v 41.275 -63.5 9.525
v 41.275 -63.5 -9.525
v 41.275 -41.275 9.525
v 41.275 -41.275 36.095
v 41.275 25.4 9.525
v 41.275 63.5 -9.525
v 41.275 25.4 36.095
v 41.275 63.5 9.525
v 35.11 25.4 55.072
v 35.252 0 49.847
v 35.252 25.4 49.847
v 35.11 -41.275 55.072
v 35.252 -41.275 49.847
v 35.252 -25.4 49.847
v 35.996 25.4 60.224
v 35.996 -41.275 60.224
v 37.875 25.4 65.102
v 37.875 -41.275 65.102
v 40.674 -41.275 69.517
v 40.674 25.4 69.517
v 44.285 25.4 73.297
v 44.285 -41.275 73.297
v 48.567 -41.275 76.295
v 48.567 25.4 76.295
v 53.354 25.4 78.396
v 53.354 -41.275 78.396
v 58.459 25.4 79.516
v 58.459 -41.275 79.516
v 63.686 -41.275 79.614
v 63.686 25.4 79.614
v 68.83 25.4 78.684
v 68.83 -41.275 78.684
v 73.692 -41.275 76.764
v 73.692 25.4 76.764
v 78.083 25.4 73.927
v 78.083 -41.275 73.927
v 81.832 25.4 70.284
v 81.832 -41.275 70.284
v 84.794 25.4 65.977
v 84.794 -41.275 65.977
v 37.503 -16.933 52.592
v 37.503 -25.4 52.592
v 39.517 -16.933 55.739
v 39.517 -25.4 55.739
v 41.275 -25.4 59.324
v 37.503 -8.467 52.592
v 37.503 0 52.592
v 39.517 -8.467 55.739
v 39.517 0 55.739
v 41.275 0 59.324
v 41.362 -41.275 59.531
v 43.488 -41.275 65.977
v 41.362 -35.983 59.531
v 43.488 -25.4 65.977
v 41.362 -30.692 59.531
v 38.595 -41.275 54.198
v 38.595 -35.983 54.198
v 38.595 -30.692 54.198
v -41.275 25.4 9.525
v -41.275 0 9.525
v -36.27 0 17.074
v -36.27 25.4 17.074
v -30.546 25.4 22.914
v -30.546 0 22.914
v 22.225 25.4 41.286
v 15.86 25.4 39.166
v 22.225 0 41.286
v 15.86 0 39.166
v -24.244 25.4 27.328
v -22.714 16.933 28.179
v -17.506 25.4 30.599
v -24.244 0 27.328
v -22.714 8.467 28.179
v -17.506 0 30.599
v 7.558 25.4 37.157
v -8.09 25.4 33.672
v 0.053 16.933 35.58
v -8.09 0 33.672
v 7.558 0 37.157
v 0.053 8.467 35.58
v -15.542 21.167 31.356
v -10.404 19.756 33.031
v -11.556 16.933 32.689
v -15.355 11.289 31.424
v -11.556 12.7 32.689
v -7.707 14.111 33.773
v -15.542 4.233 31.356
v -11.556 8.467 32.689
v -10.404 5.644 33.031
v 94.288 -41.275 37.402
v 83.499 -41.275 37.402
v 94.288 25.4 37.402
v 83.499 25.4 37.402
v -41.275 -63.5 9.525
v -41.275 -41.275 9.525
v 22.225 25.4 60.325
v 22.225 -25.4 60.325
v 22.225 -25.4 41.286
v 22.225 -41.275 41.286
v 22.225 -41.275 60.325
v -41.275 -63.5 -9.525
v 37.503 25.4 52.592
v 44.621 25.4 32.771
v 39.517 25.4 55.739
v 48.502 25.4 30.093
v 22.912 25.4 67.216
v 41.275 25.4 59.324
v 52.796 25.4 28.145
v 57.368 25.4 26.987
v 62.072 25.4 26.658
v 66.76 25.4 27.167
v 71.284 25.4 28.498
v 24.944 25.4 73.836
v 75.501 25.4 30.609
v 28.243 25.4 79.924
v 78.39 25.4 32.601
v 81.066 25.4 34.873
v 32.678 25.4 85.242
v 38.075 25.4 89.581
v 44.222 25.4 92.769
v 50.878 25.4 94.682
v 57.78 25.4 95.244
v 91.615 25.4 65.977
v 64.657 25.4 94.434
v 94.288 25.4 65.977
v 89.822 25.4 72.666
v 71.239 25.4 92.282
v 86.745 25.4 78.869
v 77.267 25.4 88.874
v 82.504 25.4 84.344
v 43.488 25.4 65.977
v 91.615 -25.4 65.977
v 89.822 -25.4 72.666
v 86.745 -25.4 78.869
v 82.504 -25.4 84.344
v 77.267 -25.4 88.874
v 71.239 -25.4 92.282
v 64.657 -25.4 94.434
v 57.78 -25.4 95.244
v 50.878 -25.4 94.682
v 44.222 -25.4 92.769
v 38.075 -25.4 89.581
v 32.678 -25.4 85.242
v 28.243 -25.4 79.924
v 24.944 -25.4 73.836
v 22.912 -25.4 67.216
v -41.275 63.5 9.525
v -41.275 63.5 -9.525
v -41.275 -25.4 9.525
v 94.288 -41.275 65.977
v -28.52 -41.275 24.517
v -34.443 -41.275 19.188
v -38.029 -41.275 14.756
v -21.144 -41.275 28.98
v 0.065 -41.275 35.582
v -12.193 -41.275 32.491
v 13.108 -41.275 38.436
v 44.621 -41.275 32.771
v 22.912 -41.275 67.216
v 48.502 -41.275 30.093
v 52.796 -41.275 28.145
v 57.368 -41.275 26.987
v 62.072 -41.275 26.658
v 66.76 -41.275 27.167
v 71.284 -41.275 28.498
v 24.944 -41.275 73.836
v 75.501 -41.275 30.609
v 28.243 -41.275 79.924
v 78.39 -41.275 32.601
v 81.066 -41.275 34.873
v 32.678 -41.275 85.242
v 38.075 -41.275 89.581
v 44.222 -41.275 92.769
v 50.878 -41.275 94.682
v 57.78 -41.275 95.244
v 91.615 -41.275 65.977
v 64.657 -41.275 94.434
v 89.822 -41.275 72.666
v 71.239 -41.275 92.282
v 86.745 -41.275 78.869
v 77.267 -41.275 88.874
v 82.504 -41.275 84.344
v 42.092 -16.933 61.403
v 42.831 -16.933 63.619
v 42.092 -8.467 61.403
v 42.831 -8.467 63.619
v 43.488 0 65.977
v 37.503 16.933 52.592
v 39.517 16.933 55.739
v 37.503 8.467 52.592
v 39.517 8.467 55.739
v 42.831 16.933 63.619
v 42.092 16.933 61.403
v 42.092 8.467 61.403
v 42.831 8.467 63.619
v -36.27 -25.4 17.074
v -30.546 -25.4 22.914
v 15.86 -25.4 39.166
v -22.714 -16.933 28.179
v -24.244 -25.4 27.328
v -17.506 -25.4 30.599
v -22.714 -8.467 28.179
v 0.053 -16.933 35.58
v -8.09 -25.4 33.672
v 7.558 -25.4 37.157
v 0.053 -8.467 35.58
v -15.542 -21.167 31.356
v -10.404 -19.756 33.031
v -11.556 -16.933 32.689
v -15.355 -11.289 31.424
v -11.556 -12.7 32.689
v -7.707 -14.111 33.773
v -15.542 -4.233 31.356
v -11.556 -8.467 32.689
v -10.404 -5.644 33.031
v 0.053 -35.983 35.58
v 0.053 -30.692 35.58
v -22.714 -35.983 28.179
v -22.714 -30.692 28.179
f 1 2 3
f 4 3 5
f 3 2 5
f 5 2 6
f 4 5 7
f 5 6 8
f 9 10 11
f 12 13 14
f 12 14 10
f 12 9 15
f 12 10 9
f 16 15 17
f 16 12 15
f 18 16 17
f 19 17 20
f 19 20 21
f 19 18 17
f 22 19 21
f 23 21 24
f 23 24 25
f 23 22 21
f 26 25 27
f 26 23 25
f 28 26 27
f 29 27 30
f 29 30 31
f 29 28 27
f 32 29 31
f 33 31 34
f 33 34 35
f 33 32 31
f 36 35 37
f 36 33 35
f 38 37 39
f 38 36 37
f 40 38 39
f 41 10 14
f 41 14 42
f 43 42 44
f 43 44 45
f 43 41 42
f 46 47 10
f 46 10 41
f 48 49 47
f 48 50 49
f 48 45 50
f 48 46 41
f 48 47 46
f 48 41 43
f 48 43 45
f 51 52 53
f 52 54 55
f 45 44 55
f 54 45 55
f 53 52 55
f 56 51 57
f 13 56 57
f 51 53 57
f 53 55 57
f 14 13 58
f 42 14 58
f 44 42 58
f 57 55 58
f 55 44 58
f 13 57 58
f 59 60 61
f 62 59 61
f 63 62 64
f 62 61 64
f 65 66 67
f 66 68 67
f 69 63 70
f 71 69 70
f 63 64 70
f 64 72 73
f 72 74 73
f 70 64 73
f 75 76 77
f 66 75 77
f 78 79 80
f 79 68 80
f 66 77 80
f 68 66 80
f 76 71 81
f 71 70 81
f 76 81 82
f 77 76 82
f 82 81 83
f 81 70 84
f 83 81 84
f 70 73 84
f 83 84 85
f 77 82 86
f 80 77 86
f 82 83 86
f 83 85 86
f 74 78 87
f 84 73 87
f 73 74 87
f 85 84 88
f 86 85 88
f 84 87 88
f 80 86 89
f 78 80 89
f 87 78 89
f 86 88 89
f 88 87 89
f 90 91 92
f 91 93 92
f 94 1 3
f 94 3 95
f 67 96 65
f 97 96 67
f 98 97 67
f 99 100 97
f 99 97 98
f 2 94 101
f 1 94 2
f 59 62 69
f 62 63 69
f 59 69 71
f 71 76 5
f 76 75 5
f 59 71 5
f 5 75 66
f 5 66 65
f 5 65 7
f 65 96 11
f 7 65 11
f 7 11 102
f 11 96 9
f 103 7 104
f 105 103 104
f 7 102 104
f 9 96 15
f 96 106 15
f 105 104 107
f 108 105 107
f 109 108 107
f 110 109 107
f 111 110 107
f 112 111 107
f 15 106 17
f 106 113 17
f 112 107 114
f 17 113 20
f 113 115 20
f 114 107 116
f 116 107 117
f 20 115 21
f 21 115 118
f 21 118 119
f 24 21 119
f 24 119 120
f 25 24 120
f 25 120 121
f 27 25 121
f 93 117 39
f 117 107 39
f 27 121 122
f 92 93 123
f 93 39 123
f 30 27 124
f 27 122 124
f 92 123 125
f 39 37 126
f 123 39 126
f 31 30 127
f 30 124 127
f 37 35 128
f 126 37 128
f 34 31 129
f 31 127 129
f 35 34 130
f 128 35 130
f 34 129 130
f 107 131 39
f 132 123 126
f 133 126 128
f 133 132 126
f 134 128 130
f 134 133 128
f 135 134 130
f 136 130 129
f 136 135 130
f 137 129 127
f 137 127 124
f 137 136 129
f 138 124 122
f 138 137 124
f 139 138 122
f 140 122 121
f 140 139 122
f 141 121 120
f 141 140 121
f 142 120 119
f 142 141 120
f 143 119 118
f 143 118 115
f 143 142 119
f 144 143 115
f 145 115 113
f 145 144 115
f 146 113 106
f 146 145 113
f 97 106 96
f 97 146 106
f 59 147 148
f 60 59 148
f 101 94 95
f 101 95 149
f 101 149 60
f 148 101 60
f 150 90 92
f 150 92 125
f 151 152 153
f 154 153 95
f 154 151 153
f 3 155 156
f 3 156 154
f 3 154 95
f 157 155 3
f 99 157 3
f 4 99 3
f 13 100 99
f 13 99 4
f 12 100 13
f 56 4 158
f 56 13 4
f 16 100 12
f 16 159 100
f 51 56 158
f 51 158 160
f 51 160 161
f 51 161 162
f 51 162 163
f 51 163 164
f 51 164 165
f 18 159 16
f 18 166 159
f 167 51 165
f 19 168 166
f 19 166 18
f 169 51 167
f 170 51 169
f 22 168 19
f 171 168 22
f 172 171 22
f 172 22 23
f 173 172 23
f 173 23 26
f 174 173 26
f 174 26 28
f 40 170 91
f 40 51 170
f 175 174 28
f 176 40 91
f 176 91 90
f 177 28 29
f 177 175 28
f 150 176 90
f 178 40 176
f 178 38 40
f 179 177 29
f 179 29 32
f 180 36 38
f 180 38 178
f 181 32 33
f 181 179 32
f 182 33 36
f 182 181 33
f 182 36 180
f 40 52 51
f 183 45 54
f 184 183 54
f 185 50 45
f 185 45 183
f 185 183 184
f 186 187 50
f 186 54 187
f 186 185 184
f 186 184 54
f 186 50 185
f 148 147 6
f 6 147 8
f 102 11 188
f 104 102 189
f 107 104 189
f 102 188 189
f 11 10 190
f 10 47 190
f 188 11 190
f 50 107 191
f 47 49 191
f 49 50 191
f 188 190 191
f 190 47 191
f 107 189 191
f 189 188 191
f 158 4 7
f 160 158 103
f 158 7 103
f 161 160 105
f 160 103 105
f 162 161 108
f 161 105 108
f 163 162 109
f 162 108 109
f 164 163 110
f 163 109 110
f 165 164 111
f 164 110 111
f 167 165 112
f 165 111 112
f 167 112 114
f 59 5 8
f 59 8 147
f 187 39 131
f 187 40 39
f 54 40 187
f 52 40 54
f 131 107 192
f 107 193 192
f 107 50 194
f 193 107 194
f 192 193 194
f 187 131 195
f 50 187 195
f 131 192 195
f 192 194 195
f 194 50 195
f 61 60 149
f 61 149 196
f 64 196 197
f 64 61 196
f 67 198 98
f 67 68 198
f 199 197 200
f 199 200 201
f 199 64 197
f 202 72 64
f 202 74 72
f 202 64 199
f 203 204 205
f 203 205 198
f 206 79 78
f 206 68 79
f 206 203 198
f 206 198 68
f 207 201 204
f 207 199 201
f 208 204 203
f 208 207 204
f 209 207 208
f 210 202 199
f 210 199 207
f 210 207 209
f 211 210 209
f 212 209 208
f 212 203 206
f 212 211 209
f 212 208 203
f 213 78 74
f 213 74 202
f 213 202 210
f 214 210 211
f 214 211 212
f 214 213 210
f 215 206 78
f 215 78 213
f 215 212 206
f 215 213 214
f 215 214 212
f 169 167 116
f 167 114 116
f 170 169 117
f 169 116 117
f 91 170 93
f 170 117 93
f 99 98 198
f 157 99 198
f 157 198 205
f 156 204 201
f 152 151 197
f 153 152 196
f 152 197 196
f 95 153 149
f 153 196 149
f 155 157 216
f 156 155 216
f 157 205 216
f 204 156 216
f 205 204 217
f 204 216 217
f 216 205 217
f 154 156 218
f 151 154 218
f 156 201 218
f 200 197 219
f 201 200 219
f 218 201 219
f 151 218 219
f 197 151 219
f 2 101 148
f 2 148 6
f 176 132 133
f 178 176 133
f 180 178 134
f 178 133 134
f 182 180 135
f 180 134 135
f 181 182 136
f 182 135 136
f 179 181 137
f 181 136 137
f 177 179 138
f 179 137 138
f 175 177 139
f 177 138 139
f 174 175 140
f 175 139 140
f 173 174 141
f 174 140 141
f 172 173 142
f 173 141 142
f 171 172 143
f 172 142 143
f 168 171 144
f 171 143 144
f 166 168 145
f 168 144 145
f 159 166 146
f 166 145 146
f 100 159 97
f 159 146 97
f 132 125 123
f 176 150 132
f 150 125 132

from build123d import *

# Parameters (mm, degrees)
F1_DEPTH = 63.5
F2_DEPTH = 25.4
F3_DEPTH = 15.875


with BuildPart() as f1:
    # F0 (on Front) → F1 (new body, symmetric)
    with BuildSketch(Plane.XZ):
        Polygon((41.275, -9.525), (41.275, 9.525), (22.225, 9.525), (-41.275, 9.525), (-41.275, -9.525), align=None)
    extrude(amount=F1_DEPTH, both=True)

    # F0 (on Front) → F2 (join, symmetric)
    with BuildSketch(Plane.XZ):
        Polygon((41.275, -9.525), (41.275, 9.525), (22.225, 9.525), (-41.275, 9.525), (-41.275, -9.525), align=None)
        with BuildLine():
            Line((22.225, 9.525), (41.275, 9.525))
            Line((41.275, 9.525), (41.275, 36.094566609))
            ThreePointArc((41.275, 36.094566609), (37.2701177009, 42.5355625854), (35.2519640423, 49.8466888466))
            add(Edge.make_bspline(
                [(22.225, 41.2858579773), (27.1473848913, 43.2390175142), (31.5927512489, 45.8874426384), (35.2519640423, 49.8466888466)],
                knots=[68.7075286576, 68.7075286576, 68.7075286576, 68.7075286576, 85.3888938388, 85.3888938388, 85.3888938388, 85.3888938388], degree=3))
            Line((22.225, 41.2858579773), (22.225, 9.525))
        make_face()
        with BuildLine():
            Line((-41.275, 9.525), (22.225, 9.525))
            Line((22.225, 9.525), (22.225, 41.2858579773))
            add(Edge.make_bspline(
                [(-41.275, 9.525), (-26.416290782, 36.991388499), (1.9505861672, 33.2411468041), (22.225, 41.2858579773)],
                knots=[0, 0, 0, 0, 68.7075286576, 68.7075286576, 68.7075286576, 68.7075286576], degree=3))
        make_face()
        with BuildLine():
            ThreePointArc((35.2519640423, 49.8466888466), (37.2701177009, 42.5355625854), (41.275, 36.094566609))
            Line((41.275, 36.094566609), (41.275, 59.3244851528))
            add(Edge.make_bspline(
                [(35.2519640423, 49.8466888466), (37.6153515316, 52.4038598787), (39.6507933359, 55.5078428034), (41.275, 59.3244851528)],
                knots=[85.3888938388, 85.3888938388, 85.3888938388, 85.3888938388, 96.162940608, 96.162940608, 96.162940608, 96.162940608], degree=3))
        make_face()
        with BuildLine():
            Line((41.275, 59.3244851528), (41.275, 36.094566609))
            ThreePointArc((41.275, 36.094566609), (57.3677651162, 26.987491807), (75.5005331428, 30.6094559468))
            ThreePointArc((75.5005331428, 30.6094559468), (79.7565516079, 33.7035903942), (83.4994215816, 37.4020070167))
            Line((83.4994215816, 37.4020070167), (43.4881349932, 37.4020070167))
            Line((43.4881349932, 37.4020070167), (43.4881349932, 65.9770070167))
            add(Edge.make_bspline(
                [(41.275, 59.3244851528), (42.1309988934, 61.335954321), (42.872774659, 63.5453690941), (43.4881349932, 65.9770070167)],
                knots=[96.162940608, 96.162940608, 96.162940608, 96.162940608, 101.8411417359, 101.8411417359, 101.8411417359, 101.8411417359], degree=3))
        make_face()
        with BuildLine():
            Line((22.225, 60.325), (22.225, 41.2858579773))
            add(Edge.make_bspline(
                [(22.225, 41.2858579773), (27.1473848913, 43.2390175142), (31.5927512489, 45.8874426384), (35.2519640423, 49.8466888466)],
                knots=[68.7075286576, 68.7075286576, 68.7075286576, 68.7075286576, 85.3888938388, 85.3888938388, 85.3888938388, 85.3888938388], degree=3))
            ThreePointArc((35.2519640423, 49.8466888466), (53.353585698, 78.3955074484), (84.7937605886, 65.9770070167))
            Line((84.7937605886, 65.9770070167), (91.6146259472, 65.9770070167))
            ThreePointArc((91.6146259472, 65.9770070167), (54.3146372549, 95.1347162169), (22.225, 60.325))
        make_face()
        with BuildLine():
            Line((71.9847713728, 65.9770070167), (43.4881349932, 65.9770070167))
            Line((43.4881349932, 65.9770070167), (43.4881349932, 37.4020070167))
            Line((43.4881349932, 37.4020070167), (83.4994215816, 37.4020070167))
            ThreePointArc((83.4994215816, 37.4020070167), (90.7464246678, 50.7837278343), (91.6146259472, 65.9770070167))
            Line((91.6146259472, 65.9770070167), (84.7937605886, 65.9770070167))
            Line((84.7937605886, 65.9770070167), (71.9847713728, 65.9770070167))
        make_face()
        with BuildLine():
            ThreePointArc((91.6146259472, 65.9770070167), (90.7464246678, 50.7837278343), (83.4994215816, 37.4020070167))
            Line((83.4994215816, 37.4020070167), (94.2881349932, 37.4020070167))
            Line((94.2881349932, 37.4020070167), (94.2881349932, 65.9770070167))
            Line((94.2881349932, 65.9770070167), (91.6146259472, 65.9770070167))
        make_face()
    extrude(amount=F2_DEPTH, both=True)

    # F0 (on Front) + F2_face (on face) → F3 (join)
    with BuildSketch(Plane.XZ):
        Polygon((41.275, -9.525), (41.275, 9.525), (22.225, 9.525), (-41.275, 9.525), (-41.275, -9.525), align=None)
        with BuildLine():
            Line((22.225, 9.525), (41.275, 9.525))
            Line((41.275, 9.525), (41.275, 36.094566609))
            ThreePointArc((41.275, 36.094566609), (37.2701177009, 42.5355625854), (35.2519640423, 49.8466888466))
            add(Edge.make_bspline(
                [(22.225, 41.2858579773), (27.1473848913, 43.2390175142), (31.5927512489, 45.8874426384), (35.2519640423, 49.8466888466)],
                knots=[68.7075286576, 68.7075286576, 68.7075286576, 68.7075286576, 85.3888938388, 85.3888938388, 85.3888938388, 85.3888938388], degree=3))
            Line((22.225, 41.2858579773), (22.225, 9.525))
        make_face()
        with BuildLine():
            Line((-41.275, 9.525), (22.225, 9.525))
            Line((22.225, 9.525), (22.225, 41.2858579773))
            add(Edge.make_bspline(
                [(-41.275, 9.525), (-26.416290782, 36.991388499), (1.9505861672, 33.2411468041), (22.225, 41.2858579773)],
                knots=[0, 0, 0, 0, 68.7075286576, 68.7075286576, 68.7075286576, 68.7075286576], degree=3))
        make_face()
        with BuildLine():
            ThreePointArc((35.2519640423, 49.8466888466), (37.2701177009, 42.5355625854), (41.275, 36.094566609))
            Line((41.275, 36.094566609), (41.275, 59.3244851528))
            add(Edge.make_bspline(
                [(35.2519640423, 49.8466888466), (37.6153515316, 52.4038598787), (39.6507933359, 55.5078428034), (41.275, 59.3244851528)],
                knots=[85.3888938388, 85.3888938388, 85.3888938388, 85.3888938388, 96.162940608, 96.162940608, 96.162940608, 96.162940608], degree=3))
        make_face()
        with BuildLine():
            Line((41.275, 59.3244851528), (41.275, 36.094566609))
            ThreePointArc((41.275, 36.094566609), (57.3677651162, 26.987491807), (75.5005331428, 30.6094559468))
            ThreePointArc((75.5005331428, 30.6094559468), (79.7565516079, 33.7035903942), (83.4994215816, 37.4020070167))
            Line((83.4994215816, 37.4020070167), (43.4881349932, 37.4020070167))
            Line((43.4881349932, 37.4020070167), (43.4881349932, 65.9770070167))
            add(Edge.make_bspline(
                [(41.275, 59.3244851528), (42.1309988934, 61.335954321), (42.872774659, 63.5453690941), (43.4881349932, 65.9770070167)],
                knots=[96.162940608, 96.162940608, 96.162940608, 96.162940608, 101.8411417359, 101.8411417359, 101.8411417359, 101.8411417359], degree=3))
        make_face()
        with BuildLine():
            Line((22.225, 60.325), (22.225, 41.2858579773))
            add(Edge.make_bspline(
                [(22.225, 41.2858579773), (27.1473848913, 43.2390175142), (31.5927512489, 45.8874426384), (35.2519640423, 49.8466888466)],
                knots=[68.7075286576, 68.7075286576, 68.7075286576, 68.7075286576, 85.3888938388, 85.3888938388, 85.3888938388, 85.3888938388], degree=3))
            ThreePointArc((35.2519640423, 49.8466888466), (53.353585698, 78.3955074484), (84.7937605886, 65.9770070167))
            Line((84.7937605886, 65.9770070167), (91.6146259472, 65.9770070167))
            ThreePointArc((91.6146259472, 65.9770070167), (54.3146372549, 95.1347162169), (22.225, 60.325))
        make_face()
        with BuildLine():
            Line((71.9847713728, 65.9770070167), (43.4881349932, 65.9770070167))
            Line((43.4881349932, 65.9770070167), (43.4881349932, 37.4020070167))
            Line((43.4881349932, 37.4020070167), (83.4994215816, 37.4020070167))
            ThreePointArc((83.4994215816, 37.4020070167), (90.7464246678, 50.7837278343), (91.6146259472, 65.9770070167))
            Line((91.6146259472, 65.9770070167), (84.7937605886, 65.9770070167))
            Line((84.7937605886, 65.9770070167), (71.9847713728, 65.9770070167))
        make_face()
        with BuildLine():
            ThreePointArc((91.6146259472, 65.9770070167), (90.7464246678, 50.7837278343), (83.4994215816, 37.4020070167))
            Line((83.4994215816, 37.4020070167), (94.2881349932, 37.4020070167))
            Line((94.2881349932, 37.4020070167), (94.2881349932, 65.9770070167))
            Line((94.2881349932, 65.9770070167), (91.6146259472, 65.9770070167))
        make_face()
    with BuildSketch(Plane(origin=(39.5464553356, -25.4, 45.7929419382), x_dir=(1, 0, 0), z_dir=(0, -1, 0))):
        with BuildLine():
            Line((-80.8214553356, -36.2679419382), (1.7285446644, -36.2679419382))
            Line((1.7285446644, -36.2679419382), (1.7285446644, -9.6983753292))
            ThreePointArc((1.7285446644, -9.6983753292), (17.8213097807, -18.8054501311), (35.9540778072, -15.1834859914))
            ThreePointArc((35.9540778072, -15.1834859914), (40.2100962723, -12.089351544), (43.952966246, -8.3909349215))
            Line((43.952966246, -8.3909349215), (54.7416796576, -8.3909349215))
            Line((54.7416796576, -8.3909349215), (54.7416796576, 20.1840650785))
            Line((54.7416796576, 20.1840650785), (52.0681706117, 20.1840650785))
            ThreePointArc((52.0681706117, 20.1840650785), (14.7681819193, 49.3417742788), (-17.3214553356, 14.5320580618))
            Line((-17.3214553356, 14.5320580618), (-17.3214553356, -4.5070839609))
            add(Edge.make_bspline(
                [(-17.3214553356, -4.5070839609), (-37.5958691684, -12.5517951341), (-65.9627461175, -8.8015534392), (-80.8214553356, -36.2679419382)],
                knots=[129.2965536863, 129.2965536863, 129.2965536863, 129.2965536863, 198.004082344, 198.004082344, 198.004082344, 198.004082344], degree=3))
        make_face()
        with BuildLine():
            add(Edge.make_bspline(
                [(3.9416796576, 20.1840650785), (2.158709922, 13.1385397446), (-0.6855375098, 7.9586131706), (-4.2944912933, 4.0537469084)],
                knots=[96.162940608, 96.162940608, 96.162940608, 96.162940608, 112.6151885052, 112.6151885052, 112.6151885052, 112.6151885052], degree=3))
            ThreePointArc((-4.2944912933, 4.0537469084), (13.8071303624, 32.6025655102), (45.247305253, 20.1840650785))
            Line((45.247305253, 20.1840650785), (3.9416796576, 20.1840650785))
        make_face(mode=Mode.SUBTRACT)
    extrude(amount=F3_DEPTH)


solid = f1.part
